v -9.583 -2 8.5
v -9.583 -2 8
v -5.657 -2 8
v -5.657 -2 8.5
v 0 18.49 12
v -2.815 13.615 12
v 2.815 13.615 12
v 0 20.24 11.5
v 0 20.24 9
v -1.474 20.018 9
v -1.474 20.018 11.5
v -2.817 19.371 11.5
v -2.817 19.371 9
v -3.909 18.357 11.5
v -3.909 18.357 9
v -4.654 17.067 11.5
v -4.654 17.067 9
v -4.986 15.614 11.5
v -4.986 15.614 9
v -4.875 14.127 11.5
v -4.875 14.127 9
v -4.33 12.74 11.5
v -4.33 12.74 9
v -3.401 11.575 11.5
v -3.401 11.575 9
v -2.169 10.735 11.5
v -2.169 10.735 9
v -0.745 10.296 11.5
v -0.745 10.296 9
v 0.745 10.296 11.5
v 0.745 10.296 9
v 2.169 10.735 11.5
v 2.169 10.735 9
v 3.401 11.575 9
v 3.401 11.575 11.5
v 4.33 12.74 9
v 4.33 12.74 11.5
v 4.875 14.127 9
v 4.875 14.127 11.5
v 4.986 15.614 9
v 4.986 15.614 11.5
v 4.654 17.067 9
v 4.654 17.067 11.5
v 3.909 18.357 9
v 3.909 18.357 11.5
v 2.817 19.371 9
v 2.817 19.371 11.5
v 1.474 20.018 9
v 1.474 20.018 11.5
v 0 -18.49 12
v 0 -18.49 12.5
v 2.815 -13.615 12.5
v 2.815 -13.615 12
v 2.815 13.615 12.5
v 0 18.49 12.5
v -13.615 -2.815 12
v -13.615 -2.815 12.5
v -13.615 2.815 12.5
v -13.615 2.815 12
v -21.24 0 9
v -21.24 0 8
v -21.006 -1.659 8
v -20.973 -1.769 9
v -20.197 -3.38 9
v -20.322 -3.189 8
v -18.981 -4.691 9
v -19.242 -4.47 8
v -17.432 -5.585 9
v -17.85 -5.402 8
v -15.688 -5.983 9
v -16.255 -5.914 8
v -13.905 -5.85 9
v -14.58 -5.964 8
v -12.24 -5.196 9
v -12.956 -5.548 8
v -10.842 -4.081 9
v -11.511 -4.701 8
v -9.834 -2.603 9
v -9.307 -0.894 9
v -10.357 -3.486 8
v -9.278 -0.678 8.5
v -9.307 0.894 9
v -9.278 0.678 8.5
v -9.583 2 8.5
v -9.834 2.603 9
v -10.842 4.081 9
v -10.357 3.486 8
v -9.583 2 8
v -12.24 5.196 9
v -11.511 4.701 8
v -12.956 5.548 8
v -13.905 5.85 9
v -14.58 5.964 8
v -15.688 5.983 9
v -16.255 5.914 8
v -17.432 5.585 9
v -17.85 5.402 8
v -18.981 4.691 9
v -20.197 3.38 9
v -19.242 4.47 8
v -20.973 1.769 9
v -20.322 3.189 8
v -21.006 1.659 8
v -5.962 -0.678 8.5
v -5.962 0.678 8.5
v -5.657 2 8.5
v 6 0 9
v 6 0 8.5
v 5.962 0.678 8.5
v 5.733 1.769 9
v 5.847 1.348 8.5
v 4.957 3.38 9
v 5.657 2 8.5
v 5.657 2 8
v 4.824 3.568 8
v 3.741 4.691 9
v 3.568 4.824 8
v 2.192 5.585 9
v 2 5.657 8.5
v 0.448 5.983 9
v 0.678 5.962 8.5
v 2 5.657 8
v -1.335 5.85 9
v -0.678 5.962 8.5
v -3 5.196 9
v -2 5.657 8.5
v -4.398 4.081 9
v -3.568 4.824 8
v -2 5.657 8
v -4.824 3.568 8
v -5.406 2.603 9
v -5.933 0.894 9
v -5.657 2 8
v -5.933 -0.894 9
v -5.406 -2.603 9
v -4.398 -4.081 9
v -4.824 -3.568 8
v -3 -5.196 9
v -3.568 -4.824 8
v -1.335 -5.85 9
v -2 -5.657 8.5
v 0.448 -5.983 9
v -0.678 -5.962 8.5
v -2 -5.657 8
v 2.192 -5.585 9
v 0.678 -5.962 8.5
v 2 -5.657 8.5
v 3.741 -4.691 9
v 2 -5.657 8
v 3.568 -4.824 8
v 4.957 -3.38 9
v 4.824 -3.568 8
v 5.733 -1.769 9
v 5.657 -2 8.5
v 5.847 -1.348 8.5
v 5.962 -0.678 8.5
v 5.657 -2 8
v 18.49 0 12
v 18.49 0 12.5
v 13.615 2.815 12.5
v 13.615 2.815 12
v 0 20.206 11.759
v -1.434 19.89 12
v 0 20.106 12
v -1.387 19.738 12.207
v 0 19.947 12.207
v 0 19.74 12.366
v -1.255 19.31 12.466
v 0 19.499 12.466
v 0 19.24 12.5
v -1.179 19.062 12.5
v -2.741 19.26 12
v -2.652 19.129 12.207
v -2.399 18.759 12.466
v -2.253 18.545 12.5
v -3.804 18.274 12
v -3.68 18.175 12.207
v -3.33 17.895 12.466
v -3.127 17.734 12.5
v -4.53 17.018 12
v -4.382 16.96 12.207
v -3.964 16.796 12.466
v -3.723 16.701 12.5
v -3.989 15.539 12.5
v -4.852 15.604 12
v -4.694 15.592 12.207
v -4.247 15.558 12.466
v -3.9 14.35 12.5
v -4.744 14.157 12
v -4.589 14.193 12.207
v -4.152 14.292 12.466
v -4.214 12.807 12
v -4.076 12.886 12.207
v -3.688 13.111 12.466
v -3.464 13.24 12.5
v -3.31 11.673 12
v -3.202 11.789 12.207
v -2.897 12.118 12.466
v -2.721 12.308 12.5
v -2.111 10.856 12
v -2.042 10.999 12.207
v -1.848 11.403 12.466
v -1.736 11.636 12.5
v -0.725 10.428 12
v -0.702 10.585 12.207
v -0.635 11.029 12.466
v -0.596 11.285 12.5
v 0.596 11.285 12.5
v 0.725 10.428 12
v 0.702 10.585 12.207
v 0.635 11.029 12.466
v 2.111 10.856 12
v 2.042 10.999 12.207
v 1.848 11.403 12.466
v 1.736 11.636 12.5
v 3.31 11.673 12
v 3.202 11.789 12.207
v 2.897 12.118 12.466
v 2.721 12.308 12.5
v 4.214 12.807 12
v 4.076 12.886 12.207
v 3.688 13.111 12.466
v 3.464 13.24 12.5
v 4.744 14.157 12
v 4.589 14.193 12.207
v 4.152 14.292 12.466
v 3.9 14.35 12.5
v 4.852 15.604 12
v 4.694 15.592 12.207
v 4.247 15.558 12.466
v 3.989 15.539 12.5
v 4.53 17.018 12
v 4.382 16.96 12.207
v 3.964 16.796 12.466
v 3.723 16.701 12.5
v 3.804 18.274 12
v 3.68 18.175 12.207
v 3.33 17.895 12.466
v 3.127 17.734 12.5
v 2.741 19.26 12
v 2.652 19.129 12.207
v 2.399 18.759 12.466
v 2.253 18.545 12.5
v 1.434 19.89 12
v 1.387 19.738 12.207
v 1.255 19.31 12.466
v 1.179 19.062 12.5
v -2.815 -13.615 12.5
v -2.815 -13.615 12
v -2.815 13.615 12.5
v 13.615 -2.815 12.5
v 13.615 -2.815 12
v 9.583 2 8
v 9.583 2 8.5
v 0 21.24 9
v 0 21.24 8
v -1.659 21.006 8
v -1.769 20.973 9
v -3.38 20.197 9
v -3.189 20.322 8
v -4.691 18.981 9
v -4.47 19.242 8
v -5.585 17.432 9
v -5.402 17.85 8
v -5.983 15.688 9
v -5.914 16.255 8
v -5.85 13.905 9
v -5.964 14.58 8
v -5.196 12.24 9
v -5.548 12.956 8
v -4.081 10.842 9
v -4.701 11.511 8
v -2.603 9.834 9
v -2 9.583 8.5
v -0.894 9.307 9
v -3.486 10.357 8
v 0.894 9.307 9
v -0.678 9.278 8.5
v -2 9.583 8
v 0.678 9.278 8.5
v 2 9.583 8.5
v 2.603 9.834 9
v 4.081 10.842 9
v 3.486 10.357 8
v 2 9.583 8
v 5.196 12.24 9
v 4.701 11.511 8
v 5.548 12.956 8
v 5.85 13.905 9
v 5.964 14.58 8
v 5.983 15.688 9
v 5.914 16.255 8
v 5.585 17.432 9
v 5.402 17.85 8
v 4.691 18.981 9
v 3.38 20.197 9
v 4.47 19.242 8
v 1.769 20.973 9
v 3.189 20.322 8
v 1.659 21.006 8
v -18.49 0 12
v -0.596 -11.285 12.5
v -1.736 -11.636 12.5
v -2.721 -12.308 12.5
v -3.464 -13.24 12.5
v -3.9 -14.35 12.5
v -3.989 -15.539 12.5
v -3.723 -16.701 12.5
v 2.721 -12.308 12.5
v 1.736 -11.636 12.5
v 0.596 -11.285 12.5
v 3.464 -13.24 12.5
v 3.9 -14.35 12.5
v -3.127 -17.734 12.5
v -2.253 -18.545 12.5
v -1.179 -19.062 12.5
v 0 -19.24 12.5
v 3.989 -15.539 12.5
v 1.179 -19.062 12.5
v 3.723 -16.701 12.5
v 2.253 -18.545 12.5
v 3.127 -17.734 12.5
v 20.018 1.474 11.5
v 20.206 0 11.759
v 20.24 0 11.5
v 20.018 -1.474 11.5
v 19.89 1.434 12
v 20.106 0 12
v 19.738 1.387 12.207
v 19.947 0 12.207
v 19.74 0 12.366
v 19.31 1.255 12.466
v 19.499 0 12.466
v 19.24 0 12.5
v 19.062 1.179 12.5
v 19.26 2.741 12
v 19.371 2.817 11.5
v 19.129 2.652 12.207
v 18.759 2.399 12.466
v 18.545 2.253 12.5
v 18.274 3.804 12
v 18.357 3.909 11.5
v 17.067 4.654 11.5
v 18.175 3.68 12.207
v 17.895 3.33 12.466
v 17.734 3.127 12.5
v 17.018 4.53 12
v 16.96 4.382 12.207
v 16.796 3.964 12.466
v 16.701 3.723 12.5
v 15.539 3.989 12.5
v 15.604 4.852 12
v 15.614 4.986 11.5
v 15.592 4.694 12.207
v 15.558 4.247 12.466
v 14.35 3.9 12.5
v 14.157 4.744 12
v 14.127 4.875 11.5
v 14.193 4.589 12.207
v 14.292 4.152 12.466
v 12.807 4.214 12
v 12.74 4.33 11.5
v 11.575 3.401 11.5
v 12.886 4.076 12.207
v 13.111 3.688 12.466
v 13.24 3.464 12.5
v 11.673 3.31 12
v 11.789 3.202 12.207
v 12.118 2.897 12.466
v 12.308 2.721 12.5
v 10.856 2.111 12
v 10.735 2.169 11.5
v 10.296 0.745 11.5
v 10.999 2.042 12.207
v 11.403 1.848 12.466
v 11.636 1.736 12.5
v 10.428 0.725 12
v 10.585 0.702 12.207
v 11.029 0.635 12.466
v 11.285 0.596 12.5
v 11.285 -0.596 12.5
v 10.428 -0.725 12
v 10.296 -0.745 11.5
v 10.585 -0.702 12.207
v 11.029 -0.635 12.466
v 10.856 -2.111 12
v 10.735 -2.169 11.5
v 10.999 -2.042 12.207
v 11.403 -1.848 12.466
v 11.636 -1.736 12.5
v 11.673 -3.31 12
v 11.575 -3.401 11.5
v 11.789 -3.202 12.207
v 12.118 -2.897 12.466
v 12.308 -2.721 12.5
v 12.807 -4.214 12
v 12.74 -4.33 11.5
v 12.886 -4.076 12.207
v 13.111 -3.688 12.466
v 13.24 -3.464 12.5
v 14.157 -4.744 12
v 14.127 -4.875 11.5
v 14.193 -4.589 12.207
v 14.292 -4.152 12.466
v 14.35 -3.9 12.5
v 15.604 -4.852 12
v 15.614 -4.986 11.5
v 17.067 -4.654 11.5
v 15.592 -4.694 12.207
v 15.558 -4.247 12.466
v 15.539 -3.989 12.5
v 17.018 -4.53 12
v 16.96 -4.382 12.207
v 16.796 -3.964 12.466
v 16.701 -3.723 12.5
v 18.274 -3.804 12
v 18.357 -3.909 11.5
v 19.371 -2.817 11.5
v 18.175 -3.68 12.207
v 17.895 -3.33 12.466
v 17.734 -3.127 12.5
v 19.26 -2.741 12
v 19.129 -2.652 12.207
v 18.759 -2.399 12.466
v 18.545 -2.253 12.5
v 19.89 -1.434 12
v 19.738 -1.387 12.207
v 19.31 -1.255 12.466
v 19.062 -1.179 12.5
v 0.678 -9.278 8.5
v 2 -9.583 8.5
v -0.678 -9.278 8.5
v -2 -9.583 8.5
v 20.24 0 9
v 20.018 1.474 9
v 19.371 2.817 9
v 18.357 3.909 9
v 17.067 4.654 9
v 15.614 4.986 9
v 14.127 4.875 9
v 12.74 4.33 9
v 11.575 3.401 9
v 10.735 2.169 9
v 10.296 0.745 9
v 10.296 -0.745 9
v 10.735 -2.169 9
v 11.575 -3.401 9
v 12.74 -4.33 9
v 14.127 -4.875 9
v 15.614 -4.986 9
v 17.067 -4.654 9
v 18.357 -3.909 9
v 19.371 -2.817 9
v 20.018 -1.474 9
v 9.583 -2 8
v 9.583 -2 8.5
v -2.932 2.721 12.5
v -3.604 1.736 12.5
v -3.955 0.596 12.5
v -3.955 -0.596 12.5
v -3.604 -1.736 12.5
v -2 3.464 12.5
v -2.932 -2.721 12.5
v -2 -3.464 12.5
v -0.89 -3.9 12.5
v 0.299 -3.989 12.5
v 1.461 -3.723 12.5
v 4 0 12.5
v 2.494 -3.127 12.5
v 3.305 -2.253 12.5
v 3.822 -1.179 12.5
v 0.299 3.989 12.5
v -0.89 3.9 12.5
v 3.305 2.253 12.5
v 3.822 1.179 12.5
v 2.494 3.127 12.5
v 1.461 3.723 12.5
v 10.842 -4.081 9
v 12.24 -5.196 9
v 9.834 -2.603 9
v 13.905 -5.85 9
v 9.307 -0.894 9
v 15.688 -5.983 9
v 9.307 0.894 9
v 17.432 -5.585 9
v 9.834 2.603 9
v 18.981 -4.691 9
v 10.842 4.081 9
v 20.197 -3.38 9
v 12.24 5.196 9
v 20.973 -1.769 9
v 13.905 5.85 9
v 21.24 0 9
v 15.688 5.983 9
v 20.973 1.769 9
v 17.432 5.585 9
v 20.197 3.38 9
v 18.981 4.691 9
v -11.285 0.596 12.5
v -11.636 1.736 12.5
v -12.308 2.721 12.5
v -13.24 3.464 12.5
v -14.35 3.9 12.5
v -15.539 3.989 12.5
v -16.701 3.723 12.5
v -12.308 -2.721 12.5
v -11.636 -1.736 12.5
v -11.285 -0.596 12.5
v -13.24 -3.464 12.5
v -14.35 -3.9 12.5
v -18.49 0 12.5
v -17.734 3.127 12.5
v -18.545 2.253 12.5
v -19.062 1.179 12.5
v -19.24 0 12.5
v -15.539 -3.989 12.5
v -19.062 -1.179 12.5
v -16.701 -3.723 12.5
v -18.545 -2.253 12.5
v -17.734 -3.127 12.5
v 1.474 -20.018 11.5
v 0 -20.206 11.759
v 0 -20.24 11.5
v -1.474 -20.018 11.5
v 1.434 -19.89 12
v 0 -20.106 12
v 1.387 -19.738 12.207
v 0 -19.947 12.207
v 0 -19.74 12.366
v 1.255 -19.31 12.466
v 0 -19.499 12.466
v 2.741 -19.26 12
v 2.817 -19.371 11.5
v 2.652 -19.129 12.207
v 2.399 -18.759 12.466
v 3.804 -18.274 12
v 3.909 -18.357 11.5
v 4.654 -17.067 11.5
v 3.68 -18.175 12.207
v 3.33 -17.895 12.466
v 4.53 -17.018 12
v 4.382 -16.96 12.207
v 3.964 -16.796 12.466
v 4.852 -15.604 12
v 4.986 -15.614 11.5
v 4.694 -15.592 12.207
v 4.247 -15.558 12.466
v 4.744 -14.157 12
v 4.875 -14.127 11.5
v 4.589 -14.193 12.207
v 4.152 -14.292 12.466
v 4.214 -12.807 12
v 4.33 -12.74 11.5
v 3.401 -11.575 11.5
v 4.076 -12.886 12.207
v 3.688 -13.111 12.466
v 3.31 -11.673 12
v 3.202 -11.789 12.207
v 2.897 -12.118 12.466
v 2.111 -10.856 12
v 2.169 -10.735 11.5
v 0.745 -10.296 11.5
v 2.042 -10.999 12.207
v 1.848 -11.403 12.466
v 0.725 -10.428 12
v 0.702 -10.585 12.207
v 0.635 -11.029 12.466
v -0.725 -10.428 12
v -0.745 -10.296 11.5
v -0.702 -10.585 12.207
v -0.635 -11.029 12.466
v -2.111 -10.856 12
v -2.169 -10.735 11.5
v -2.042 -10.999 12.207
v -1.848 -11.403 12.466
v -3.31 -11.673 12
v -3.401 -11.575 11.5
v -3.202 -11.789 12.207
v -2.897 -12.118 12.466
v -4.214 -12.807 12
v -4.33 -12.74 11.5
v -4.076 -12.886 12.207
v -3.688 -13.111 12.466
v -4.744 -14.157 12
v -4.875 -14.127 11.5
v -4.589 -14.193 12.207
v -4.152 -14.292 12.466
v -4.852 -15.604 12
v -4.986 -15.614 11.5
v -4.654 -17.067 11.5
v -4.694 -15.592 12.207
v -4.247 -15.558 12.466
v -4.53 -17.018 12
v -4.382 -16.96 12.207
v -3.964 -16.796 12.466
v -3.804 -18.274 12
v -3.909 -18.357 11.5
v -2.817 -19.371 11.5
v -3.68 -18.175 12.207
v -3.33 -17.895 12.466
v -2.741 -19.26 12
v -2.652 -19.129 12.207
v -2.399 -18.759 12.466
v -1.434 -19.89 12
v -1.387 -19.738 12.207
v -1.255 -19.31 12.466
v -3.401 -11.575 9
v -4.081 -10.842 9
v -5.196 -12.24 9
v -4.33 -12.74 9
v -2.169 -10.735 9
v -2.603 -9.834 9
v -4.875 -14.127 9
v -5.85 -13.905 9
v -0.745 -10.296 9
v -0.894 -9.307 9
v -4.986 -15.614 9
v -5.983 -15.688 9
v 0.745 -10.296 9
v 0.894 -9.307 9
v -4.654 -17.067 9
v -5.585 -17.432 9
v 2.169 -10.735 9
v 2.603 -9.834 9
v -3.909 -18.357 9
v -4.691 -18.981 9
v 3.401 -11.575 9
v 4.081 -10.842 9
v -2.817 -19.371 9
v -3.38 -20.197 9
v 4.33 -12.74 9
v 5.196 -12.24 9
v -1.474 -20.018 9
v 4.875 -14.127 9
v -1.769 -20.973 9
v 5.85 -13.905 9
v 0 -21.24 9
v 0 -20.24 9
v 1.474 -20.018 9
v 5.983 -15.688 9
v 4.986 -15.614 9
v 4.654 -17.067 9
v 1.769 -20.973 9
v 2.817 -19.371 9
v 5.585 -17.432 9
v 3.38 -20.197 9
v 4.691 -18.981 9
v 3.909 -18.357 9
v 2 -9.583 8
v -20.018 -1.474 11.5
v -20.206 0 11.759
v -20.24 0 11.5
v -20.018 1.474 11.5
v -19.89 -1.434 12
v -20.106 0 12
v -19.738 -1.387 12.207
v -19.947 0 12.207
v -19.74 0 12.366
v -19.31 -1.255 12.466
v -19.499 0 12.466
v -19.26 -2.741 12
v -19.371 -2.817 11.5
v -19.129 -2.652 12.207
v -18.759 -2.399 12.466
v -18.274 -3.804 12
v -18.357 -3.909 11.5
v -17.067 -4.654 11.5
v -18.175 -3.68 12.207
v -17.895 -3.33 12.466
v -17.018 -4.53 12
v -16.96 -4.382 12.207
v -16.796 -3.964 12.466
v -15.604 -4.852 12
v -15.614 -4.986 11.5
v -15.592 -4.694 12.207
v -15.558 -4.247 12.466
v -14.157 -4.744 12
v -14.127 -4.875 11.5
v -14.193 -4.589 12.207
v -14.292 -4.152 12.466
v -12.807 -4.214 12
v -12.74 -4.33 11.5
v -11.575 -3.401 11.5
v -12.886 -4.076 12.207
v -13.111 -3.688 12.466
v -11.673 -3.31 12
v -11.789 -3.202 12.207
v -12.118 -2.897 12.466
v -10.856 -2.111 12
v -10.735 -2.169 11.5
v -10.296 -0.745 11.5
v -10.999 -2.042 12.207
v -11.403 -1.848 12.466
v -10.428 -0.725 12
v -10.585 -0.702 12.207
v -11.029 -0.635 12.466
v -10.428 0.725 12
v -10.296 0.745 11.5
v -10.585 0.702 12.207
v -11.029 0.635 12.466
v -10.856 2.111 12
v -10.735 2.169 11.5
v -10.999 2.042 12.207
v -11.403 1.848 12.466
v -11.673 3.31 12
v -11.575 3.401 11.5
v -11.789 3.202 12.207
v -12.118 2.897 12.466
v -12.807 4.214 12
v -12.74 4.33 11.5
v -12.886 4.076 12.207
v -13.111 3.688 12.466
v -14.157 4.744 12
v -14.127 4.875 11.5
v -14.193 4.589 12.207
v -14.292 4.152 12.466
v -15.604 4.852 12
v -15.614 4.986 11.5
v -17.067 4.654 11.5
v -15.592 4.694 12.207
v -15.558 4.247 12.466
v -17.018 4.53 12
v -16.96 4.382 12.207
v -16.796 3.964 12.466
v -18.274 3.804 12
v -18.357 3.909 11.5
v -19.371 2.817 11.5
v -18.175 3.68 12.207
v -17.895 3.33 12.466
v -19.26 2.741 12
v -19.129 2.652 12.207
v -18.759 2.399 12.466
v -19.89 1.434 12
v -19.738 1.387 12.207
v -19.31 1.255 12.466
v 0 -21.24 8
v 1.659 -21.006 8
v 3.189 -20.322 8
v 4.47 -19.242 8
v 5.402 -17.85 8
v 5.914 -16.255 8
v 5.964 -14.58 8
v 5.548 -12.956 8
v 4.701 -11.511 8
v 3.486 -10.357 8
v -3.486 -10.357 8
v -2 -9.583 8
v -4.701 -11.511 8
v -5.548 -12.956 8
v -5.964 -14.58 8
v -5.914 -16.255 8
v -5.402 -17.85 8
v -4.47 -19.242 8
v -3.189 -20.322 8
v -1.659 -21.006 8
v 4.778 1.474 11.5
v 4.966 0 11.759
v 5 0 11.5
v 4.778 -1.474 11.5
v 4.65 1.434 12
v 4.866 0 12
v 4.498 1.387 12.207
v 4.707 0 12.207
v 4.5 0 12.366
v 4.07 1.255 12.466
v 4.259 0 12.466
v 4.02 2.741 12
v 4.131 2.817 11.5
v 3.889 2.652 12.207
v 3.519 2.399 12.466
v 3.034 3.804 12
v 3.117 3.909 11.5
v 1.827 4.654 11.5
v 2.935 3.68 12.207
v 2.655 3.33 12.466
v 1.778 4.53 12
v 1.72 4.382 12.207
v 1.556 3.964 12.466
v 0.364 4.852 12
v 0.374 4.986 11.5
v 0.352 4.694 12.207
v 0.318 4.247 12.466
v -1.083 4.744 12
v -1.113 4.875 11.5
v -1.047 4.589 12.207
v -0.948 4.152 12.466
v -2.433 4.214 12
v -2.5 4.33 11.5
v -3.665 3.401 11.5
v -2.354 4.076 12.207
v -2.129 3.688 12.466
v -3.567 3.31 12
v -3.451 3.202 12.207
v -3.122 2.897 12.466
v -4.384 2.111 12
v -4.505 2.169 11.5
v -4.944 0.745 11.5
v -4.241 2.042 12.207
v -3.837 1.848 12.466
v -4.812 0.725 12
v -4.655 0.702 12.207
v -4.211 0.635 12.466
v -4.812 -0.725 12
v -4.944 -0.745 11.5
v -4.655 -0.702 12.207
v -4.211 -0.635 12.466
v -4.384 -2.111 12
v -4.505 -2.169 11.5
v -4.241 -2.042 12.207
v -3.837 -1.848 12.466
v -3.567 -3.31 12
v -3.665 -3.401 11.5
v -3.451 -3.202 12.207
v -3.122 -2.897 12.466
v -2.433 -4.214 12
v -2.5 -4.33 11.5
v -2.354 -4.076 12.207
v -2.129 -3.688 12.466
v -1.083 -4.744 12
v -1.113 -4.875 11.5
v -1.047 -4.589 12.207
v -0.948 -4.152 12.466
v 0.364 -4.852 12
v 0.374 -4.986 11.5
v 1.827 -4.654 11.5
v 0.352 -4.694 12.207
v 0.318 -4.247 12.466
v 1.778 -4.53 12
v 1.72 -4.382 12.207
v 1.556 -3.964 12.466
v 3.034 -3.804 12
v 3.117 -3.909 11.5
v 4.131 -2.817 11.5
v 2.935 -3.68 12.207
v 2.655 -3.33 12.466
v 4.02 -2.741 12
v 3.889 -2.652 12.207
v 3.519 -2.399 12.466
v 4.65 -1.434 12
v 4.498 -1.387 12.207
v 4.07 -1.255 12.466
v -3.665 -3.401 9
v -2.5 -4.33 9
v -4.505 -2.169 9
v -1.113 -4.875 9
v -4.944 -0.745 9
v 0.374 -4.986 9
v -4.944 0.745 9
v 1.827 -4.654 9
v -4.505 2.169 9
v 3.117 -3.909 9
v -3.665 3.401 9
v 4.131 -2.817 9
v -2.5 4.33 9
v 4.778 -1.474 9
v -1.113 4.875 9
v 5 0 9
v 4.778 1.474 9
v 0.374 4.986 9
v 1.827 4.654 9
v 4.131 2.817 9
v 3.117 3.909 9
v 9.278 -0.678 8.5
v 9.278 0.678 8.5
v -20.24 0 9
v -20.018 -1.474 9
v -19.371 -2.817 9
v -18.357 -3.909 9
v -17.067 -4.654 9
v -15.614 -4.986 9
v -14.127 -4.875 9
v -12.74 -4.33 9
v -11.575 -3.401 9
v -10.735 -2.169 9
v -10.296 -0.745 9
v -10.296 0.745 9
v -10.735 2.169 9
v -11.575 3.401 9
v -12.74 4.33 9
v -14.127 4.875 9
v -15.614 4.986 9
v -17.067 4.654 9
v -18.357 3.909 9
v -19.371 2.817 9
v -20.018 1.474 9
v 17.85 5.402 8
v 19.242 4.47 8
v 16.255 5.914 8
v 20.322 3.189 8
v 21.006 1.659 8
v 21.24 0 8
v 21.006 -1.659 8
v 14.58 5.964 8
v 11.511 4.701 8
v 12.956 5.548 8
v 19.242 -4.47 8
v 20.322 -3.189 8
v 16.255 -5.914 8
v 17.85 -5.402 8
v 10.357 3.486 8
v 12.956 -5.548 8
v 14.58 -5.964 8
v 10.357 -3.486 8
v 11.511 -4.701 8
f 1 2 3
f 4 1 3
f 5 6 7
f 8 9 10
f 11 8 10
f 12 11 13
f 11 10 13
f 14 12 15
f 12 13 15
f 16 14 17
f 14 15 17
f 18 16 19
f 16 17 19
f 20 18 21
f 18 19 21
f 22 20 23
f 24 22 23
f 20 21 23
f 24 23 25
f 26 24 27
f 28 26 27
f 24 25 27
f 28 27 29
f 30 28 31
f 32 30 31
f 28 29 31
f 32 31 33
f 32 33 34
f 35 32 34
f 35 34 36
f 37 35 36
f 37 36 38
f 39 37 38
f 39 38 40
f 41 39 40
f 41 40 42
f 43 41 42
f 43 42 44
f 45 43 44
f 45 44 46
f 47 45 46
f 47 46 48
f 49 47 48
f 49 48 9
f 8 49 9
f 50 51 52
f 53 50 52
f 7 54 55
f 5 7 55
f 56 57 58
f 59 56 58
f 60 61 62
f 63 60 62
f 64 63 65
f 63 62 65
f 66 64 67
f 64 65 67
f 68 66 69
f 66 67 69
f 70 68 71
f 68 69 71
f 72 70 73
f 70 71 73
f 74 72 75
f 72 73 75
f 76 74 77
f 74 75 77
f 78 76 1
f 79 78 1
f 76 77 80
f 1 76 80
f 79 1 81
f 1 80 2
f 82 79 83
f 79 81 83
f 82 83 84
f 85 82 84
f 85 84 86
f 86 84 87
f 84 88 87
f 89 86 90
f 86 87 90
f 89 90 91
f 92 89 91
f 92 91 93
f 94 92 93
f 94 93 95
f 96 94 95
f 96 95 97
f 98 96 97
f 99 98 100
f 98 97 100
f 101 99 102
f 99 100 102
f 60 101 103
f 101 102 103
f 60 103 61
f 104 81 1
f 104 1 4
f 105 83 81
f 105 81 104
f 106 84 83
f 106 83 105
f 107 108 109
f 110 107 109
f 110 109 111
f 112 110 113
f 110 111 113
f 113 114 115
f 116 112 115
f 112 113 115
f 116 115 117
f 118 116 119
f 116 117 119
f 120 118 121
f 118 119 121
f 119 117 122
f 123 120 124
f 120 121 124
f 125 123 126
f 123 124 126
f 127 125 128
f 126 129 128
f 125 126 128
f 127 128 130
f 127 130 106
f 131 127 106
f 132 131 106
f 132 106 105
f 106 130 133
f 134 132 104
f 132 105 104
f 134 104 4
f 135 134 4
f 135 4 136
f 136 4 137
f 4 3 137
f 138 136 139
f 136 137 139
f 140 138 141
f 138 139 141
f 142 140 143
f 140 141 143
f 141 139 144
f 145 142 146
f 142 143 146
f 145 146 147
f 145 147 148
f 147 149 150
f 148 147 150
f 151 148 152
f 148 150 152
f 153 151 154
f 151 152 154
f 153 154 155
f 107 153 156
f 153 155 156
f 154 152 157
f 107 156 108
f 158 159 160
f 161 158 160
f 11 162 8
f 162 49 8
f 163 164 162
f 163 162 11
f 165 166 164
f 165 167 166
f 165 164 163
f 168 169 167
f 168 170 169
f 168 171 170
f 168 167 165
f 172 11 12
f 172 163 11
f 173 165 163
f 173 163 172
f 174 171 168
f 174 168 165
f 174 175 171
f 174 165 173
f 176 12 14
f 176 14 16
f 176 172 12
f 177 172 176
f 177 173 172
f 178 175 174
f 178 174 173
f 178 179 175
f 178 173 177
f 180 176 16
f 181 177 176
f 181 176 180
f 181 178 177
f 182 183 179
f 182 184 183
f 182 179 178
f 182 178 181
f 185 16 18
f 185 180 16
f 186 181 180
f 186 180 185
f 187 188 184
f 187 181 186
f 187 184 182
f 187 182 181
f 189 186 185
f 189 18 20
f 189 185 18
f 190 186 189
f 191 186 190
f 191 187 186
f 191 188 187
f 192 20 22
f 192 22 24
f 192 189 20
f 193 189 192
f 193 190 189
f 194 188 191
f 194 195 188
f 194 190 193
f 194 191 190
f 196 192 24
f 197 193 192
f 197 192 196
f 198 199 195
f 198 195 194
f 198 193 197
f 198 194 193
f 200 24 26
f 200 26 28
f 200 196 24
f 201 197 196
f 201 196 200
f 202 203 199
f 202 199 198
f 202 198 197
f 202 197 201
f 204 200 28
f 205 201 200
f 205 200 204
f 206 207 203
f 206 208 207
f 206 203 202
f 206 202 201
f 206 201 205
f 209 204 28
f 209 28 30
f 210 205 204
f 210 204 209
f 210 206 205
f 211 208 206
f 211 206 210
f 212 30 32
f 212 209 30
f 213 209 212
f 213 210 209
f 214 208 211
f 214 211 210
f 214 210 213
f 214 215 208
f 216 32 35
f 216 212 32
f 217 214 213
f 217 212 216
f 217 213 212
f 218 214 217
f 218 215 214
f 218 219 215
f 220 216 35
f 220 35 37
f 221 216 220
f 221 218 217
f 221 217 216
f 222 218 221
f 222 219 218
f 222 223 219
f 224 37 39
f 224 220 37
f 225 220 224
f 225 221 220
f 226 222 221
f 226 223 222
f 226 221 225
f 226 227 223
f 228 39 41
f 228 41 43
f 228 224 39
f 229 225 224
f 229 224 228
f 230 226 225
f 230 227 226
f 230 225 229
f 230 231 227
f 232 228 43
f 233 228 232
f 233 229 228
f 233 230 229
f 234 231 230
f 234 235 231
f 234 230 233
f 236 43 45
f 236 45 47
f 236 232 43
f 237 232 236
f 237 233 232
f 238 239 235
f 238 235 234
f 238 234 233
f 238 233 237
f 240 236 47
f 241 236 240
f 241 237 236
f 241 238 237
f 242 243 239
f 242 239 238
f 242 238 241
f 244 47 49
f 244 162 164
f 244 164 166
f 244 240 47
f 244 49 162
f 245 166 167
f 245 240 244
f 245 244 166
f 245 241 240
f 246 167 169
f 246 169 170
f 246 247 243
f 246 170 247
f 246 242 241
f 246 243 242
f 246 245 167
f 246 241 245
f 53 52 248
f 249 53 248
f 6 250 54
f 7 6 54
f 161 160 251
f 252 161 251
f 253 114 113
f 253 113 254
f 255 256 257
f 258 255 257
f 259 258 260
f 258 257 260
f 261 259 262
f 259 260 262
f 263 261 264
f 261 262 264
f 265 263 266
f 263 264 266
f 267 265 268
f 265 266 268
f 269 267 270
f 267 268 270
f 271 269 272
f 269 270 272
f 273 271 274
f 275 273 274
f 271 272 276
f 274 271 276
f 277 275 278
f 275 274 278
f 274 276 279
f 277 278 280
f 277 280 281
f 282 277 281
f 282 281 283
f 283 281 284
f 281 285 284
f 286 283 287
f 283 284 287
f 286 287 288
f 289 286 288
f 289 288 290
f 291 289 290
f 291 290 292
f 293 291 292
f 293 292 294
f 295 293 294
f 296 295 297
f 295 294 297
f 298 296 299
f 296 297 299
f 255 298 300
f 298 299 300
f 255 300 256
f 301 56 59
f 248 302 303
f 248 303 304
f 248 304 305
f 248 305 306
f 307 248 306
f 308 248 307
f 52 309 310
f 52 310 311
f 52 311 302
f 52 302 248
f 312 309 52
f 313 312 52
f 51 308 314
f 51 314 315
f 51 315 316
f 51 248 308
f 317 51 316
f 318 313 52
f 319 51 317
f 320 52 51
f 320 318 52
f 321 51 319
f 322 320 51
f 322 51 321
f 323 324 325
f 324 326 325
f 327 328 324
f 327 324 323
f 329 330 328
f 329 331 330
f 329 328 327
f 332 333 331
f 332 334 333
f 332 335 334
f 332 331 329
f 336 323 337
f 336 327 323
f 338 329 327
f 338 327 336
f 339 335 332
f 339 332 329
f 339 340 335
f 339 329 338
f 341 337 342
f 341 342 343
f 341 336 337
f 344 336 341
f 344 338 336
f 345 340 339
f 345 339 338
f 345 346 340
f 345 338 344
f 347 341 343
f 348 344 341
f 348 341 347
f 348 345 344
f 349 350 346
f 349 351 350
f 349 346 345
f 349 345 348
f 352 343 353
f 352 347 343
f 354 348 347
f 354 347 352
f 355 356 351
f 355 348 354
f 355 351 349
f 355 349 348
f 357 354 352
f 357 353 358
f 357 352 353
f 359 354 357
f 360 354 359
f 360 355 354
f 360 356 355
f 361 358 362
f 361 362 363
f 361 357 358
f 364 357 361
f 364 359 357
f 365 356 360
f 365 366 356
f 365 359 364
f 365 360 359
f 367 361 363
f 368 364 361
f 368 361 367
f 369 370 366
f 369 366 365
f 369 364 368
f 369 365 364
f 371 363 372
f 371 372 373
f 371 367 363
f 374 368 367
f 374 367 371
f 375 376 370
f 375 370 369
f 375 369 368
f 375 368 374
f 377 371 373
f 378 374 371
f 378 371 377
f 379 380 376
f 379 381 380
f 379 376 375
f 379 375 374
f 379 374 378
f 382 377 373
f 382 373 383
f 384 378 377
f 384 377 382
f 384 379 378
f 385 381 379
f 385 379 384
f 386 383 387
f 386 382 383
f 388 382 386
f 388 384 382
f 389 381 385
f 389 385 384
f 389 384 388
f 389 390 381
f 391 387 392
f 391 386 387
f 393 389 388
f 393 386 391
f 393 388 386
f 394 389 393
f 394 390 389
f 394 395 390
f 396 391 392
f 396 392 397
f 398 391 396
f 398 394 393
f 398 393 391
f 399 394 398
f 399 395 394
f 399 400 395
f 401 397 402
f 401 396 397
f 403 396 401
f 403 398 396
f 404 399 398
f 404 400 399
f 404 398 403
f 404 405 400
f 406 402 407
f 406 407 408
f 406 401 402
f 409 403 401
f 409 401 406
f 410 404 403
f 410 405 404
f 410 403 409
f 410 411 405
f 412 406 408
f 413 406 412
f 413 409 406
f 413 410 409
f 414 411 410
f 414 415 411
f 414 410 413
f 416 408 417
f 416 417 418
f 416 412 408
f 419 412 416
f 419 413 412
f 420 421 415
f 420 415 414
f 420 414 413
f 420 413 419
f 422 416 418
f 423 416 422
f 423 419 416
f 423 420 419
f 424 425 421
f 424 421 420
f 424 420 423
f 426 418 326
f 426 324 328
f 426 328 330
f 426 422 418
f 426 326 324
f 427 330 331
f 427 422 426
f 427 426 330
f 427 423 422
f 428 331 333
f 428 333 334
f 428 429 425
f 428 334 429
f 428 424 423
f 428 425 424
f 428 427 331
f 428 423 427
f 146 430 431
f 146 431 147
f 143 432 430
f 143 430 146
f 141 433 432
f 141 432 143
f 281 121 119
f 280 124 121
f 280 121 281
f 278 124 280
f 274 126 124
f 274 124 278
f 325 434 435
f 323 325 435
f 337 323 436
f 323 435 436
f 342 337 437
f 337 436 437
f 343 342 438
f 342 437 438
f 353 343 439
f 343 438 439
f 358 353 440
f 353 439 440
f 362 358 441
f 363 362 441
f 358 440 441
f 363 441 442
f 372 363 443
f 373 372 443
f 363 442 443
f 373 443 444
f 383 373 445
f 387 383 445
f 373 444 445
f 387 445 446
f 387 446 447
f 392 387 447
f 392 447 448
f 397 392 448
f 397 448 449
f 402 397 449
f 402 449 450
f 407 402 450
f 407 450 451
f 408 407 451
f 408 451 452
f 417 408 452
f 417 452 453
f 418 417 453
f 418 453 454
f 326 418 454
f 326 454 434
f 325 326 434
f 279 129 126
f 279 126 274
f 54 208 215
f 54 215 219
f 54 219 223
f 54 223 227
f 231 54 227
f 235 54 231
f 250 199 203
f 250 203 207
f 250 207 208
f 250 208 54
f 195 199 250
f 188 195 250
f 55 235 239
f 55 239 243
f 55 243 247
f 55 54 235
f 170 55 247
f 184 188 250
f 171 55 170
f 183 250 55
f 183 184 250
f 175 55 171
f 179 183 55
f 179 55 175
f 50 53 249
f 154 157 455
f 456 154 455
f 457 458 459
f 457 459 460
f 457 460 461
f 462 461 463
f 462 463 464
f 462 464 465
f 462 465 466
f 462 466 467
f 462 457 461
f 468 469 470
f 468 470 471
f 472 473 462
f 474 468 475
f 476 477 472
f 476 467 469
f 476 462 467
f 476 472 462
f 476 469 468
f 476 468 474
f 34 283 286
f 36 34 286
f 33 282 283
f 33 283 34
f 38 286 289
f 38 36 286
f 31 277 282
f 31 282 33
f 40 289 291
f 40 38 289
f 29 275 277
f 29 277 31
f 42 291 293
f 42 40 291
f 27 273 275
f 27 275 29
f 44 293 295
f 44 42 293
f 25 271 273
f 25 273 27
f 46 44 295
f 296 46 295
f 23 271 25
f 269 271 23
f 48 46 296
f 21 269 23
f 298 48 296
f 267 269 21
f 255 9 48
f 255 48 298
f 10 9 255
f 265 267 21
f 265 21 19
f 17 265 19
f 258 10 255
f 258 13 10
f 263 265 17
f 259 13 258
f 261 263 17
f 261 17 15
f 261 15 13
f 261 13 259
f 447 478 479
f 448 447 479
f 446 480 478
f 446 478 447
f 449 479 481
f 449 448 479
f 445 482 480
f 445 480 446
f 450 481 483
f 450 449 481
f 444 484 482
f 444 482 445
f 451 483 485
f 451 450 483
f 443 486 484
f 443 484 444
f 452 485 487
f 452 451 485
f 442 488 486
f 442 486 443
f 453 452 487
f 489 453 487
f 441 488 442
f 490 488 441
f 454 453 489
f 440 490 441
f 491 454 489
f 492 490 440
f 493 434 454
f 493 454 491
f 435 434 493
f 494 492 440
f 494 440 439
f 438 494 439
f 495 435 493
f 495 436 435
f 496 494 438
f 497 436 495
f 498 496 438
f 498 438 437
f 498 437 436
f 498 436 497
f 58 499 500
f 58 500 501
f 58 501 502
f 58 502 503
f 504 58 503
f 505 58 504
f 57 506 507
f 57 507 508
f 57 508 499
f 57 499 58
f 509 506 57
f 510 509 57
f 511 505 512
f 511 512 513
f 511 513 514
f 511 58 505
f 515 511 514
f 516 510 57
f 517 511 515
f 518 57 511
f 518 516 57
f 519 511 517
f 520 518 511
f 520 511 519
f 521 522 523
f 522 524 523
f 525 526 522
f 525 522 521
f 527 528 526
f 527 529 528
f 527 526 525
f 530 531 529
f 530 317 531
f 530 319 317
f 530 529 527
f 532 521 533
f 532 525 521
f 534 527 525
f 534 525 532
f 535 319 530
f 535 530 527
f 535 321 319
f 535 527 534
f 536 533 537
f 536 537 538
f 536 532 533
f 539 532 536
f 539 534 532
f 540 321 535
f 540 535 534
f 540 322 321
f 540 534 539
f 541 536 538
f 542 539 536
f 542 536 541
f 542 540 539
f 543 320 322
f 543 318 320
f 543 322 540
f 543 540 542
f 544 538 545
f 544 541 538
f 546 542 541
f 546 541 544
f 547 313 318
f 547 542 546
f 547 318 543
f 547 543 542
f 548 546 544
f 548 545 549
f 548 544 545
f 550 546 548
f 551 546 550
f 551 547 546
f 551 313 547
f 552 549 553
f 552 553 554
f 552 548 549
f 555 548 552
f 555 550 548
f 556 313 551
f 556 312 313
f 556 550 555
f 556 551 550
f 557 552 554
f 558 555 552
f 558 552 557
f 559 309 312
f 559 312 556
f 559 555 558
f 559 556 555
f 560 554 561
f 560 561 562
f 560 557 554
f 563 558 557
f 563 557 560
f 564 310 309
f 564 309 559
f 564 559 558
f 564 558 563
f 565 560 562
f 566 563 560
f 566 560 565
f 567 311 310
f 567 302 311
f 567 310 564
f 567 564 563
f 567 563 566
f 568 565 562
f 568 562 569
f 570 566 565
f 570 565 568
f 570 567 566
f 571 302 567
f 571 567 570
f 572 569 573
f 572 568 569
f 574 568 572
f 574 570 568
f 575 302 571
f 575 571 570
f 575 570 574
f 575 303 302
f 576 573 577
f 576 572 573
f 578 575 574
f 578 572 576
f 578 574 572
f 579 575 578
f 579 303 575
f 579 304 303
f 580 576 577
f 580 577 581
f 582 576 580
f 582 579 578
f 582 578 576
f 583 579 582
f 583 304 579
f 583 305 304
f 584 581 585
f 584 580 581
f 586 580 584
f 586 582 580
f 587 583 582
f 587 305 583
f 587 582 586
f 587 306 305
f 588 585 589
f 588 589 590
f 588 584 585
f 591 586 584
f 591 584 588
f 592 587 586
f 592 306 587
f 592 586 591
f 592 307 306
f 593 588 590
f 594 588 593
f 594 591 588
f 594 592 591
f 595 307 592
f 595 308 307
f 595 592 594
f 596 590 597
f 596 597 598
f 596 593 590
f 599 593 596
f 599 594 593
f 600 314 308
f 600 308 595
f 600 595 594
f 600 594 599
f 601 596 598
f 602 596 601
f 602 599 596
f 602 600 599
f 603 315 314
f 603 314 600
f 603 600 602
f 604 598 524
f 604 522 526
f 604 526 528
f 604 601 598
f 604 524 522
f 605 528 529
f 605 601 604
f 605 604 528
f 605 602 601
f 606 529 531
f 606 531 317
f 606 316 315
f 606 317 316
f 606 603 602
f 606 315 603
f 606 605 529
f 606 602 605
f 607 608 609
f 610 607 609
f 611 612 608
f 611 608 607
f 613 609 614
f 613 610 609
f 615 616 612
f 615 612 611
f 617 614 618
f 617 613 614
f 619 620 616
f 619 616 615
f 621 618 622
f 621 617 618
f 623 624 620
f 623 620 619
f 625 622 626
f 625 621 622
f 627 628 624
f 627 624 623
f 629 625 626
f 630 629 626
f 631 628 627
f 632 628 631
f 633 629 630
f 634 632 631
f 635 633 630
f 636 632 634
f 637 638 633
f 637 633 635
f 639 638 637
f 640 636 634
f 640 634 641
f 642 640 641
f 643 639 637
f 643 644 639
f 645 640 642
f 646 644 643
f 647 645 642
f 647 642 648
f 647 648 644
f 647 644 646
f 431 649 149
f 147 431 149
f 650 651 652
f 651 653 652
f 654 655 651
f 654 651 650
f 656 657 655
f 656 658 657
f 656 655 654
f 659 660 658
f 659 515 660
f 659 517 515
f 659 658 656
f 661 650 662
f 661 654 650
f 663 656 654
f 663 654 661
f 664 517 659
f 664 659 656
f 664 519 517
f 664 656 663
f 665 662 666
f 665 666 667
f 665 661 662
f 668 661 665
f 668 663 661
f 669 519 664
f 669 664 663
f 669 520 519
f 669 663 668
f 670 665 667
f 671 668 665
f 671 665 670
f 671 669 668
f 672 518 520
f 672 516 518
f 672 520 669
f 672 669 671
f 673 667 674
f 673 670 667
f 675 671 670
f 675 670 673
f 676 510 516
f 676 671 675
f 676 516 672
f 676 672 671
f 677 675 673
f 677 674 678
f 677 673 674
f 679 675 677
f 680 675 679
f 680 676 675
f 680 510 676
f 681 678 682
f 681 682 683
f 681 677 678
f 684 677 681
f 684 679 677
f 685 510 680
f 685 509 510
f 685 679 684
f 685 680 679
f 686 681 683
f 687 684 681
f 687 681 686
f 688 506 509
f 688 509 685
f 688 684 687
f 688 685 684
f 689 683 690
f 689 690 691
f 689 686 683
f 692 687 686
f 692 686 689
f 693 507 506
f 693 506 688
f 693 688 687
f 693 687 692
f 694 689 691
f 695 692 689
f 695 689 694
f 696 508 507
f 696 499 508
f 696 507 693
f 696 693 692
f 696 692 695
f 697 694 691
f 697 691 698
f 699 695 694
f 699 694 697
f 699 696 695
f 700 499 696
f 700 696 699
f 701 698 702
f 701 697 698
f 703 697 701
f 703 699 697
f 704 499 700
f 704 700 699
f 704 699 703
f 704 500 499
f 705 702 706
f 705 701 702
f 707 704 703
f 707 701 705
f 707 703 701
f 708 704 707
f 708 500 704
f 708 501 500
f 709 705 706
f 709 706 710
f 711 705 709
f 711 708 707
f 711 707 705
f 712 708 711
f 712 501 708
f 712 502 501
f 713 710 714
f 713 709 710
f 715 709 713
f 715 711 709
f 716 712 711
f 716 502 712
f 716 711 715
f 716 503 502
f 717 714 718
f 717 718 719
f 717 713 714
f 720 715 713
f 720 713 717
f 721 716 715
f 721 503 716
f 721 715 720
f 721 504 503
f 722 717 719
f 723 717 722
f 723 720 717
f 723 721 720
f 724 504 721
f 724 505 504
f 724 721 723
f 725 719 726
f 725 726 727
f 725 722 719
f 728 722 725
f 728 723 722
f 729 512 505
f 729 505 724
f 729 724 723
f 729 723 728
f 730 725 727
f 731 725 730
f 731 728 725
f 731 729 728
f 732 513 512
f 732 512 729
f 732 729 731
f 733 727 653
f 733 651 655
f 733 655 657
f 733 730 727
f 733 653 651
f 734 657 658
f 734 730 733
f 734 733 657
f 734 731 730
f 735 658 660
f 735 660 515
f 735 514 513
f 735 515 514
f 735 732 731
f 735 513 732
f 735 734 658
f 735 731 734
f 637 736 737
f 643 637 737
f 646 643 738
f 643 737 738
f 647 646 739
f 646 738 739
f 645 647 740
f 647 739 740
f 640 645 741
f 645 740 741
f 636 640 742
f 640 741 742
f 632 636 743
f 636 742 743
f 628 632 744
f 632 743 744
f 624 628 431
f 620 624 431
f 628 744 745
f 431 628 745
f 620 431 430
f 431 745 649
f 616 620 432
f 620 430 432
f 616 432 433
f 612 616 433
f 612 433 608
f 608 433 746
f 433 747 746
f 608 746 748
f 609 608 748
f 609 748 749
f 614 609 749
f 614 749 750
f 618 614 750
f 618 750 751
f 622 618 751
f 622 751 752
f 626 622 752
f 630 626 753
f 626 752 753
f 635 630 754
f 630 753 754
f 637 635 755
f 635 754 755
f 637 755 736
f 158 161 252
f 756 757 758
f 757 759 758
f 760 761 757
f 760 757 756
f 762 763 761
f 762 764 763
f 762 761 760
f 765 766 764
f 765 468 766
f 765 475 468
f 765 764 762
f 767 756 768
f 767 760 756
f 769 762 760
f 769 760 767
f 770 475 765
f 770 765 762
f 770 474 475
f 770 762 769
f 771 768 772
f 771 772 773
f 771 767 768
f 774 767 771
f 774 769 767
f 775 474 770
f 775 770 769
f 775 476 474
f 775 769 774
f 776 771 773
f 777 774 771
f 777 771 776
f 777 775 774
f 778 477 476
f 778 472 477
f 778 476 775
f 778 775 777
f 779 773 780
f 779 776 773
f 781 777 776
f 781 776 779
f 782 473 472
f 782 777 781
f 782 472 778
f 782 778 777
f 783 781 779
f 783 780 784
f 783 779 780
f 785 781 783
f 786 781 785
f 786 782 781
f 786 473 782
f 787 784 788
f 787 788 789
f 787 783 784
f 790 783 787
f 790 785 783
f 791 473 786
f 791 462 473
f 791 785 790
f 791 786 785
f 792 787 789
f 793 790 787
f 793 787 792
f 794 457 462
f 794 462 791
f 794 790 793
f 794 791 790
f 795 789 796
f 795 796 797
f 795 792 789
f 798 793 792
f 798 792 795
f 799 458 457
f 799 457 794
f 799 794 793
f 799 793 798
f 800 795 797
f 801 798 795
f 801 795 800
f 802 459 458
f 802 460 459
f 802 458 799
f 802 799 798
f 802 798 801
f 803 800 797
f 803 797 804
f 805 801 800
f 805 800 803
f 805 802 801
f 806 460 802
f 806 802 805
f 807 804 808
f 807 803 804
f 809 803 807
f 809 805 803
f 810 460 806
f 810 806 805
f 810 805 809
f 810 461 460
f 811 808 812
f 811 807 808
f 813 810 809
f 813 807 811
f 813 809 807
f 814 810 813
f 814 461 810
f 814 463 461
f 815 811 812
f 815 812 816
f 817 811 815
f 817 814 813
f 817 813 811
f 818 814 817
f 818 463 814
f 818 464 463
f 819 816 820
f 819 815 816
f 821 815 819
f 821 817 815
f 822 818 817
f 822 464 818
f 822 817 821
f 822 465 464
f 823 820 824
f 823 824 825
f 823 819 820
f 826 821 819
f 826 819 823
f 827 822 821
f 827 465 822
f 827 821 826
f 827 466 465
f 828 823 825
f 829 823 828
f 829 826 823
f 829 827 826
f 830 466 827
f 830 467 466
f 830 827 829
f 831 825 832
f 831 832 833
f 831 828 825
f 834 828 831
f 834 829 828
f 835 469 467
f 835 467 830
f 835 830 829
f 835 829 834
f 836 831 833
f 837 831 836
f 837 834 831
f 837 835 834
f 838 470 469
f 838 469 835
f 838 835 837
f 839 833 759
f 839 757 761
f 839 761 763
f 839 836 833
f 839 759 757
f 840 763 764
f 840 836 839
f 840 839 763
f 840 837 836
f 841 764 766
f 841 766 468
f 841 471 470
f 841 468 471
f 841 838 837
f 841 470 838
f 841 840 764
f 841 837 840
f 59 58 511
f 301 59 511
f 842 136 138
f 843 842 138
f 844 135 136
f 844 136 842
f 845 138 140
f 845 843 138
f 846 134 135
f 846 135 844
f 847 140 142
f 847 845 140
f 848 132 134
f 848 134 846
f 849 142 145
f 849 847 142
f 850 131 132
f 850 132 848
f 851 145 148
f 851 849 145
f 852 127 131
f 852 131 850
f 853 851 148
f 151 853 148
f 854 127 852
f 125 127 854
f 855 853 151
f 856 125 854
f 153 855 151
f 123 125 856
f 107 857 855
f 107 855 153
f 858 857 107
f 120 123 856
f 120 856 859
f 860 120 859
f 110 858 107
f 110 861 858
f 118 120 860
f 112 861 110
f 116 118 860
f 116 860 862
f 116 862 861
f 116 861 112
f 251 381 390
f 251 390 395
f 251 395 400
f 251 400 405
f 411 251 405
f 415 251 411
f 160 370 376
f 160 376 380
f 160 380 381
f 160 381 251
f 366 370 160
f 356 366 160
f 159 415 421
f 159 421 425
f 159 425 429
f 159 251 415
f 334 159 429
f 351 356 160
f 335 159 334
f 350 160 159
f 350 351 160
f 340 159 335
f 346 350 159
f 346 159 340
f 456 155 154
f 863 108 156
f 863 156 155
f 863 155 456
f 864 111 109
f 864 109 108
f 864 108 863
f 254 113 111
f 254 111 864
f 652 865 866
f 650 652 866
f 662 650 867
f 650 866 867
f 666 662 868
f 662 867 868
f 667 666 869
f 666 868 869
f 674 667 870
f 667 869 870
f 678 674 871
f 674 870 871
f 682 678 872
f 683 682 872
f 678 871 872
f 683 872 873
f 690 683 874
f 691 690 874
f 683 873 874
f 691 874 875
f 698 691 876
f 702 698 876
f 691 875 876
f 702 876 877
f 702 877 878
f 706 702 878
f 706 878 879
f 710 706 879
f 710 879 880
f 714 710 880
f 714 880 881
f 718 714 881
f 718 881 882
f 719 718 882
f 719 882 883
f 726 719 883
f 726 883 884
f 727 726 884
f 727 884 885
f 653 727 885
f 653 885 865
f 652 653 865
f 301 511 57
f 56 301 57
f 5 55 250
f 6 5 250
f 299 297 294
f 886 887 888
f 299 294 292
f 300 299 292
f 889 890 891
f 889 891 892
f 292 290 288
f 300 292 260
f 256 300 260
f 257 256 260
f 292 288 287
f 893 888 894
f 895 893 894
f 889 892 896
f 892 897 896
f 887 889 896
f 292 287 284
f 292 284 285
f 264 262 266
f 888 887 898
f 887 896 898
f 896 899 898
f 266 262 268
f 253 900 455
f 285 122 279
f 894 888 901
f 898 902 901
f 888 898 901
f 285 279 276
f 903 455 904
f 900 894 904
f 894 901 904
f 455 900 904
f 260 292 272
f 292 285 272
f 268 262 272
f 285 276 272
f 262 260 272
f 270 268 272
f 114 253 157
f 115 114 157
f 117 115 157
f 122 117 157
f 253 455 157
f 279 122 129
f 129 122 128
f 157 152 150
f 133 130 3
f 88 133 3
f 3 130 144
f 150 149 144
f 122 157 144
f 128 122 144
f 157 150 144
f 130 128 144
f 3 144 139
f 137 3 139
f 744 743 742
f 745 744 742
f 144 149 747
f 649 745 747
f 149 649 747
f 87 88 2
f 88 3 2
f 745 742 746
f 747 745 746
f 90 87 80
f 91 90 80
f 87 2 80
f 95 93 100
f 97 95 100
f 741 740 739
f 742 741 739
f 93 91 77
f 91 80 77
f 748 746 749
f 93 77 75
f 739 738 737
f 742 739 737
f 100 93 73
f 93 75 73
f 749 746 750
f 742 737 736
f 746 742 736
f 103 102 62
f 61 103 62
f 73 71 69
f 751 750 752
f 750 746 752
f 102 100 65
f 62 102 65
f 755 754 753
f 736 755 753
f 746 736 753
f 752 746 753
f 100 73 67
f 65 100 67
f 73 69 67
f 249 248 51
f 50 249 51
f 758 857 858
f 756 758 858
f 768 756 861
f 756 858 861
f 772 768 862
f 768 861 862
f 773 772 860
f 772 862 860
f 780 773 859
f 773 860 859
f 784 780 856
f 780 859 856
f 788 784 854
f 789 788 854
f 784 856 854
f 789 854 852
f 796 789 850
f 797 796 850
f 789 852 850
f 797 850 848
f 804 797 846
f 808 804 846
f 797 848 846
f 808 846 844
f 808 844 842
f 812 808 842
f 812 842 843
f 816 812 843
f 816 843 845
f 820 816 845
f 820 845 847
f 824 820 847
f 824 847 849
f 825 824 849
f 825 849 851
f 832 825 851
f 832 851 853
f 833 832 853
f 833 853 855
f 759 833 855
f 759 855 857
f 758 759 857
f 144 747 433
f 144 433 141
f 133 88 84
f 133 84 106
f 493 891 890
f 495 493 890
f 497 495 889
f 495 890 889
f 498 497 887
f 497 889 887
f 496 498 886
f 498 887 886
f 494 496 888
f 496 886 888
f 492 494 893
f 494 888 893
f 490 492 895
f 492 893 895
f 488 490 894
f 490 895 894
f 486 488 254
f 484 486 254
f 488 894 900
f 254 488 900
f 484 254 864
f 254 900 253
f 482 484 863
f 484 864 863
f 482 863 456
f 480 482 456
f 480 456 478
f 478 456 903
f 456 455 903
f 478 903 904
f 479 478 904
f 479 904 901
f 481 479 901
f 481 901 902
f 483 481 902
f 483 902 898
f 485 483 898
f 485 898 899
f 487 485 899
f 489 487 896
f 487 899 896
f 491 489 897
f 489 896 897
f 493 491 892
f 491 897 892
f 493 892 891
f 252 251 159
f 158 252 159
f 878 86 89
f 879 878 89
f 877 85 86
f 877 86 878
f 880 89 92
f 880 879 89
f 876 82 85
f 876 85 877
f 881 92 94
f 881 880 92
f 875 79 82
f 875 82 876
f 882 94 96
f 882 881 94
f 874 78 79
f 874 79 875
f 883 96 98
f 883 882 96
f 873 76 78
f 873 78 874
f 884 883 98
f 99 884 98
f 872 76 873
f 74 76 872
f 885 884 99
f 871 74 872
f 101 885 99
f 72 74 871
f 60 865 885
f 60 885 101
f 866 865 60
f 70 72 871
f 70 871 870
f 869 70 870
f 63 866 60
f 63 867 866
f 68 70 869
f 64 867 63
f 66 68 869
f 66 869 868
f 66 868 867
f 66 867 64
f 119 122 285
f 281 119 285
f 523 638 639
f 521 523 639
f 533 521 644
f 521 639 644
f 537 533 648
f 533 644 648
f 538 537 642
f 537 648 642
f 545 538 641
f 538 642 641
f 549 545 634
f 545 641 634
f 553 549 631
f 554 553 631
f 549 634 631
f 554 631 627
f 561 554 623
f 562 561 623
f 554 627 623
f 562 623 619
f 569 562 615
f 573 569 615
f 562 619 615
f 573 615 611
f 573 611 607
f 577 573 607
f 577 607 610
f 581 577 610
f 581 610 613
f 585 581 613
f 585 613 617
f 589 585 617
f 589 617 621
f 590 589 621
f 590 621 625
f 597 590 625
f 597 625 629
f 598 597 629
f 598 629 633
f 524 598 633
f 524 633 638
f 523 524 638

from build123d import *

# Parameters (mm, degrees)
CYLINDER_R             = 5
CYLINDER_DEPTH         = 4.5
FILLET_R               = 1
CYLINDER001_R          = 6
CYLINDER001_DEPTH      = 1
BOX001_W               = 30.48
BOX001_H               = 4
BOX001_DEPTH           = 0.5
BOX001_PLACEMENT_ANGLE = 90
BOX_W                  = 30.48
BOX_H                  = 4
BOX_DEPTH              = 0.5
POCKET_DEPTH           = 0.5
ARRAY_COUNT            = 4


with BuildPart() as button_body_fillet:
    # Cylinder → Cylinder (new body)
    with BuildSketch(Plane.XY.offset(8)):
        Circle(CYLINDER_R)
    extrude(amount=CYLINDER_DEPTH)

    # Fillet
    fillet_edges = [button_body_fillet.edges().sort_by_distance(p)[0] for p in [
        (-5, 0, 12.5),
    ]]
    fillet(fillet_edges, radius=FILLET_R)


with BuildPart() as button_fusion:
    # Cylinder001 → Cylinder001 (new body)
    with BuildSketch(Plane.XY.offset(8)):
        Circle(CYLINDER001_R)
    extrude(amount=CYLINDER001_DEPTH)

    # Fusion: union button-body-fillet
    add(button_body_fillet.part)


with BuildPart() as buttons_forward_backward_union_cube:
    # Box001 → Box001 (new body)
    with BuildSketch(Plane.XY):
        with Locations((15.24, 2)):
            Rectangle(BOX001_W, BOX001_H)
    extrude(amount=BOX001_DEPTH)


with BuildPart() as buttons_forward_backward_union_cube_1:
    # Box001 placement: moved
    add(buttons_forward_backward_union_cube.part.moved(Location((2, -15.24, 8))).rotate(Axis((2, -15.24, 8), (0, 0, 1)), BOX001_PLACEMENT_ANGLE))


with BuildPart() as buttons_left_right_union_cube:
    # Box → Box (new body)
    with BuildSketch(Plane(origin=(-15.24, -2, 8), x_dir=(1, 0, 0), z_dir=(0, 0, 1))):
        with Locations((15.24, 2)):
            Rectangle(BOX_W, BOX_H)
    extrude(amount=BOX_DEPTH)


with BuildPart() as buttons_fusion:
    # Clone base: copy of button-fusion
    add(button_fusion.part)


with BuildPart() as buttons_fusion_1:
    # Clone placement: moved
    add(buttons_fusion.part.moved(Location((15.24, 0, 0))))

    # Sketch → Pocket (cut)
    with BuildSketch(Plane(origin=(15.24, 0, 12.5), x_dir=(1, 0, 0), z_dir=(0, 0, 1))):
        Polygon((-1.625, 2.814583), (-1.625, -2.814583), (3.25, 0), align=None)
    extrude(amount=-POCKET_DEPTH, mode=Mode.SUBTRACT)

    # Array: buttons-fusion ×4 about axis
    array_axis = Axis((0, 0, 0), (0, 0, 1))


with BuildPart() as buttons_fusion_2:
    add(buttons_fusion_1.part)
    for i in range(1, ARRAY_COUNT):
        add(buttons_fusion_1.part.rotate(array_axis, i * 360 / ARRAY_COUNT))

    # Fusion001: union button-fusion, buttons-forward-backward-union-cube, buttons-left-right-union-cube
    add(button_fusion.part)
    add(buttons_forward_backward_union_cube_1.part)
    add(buttons_left_right_union_cube.part)


solid = buttons_fusion_2.part
